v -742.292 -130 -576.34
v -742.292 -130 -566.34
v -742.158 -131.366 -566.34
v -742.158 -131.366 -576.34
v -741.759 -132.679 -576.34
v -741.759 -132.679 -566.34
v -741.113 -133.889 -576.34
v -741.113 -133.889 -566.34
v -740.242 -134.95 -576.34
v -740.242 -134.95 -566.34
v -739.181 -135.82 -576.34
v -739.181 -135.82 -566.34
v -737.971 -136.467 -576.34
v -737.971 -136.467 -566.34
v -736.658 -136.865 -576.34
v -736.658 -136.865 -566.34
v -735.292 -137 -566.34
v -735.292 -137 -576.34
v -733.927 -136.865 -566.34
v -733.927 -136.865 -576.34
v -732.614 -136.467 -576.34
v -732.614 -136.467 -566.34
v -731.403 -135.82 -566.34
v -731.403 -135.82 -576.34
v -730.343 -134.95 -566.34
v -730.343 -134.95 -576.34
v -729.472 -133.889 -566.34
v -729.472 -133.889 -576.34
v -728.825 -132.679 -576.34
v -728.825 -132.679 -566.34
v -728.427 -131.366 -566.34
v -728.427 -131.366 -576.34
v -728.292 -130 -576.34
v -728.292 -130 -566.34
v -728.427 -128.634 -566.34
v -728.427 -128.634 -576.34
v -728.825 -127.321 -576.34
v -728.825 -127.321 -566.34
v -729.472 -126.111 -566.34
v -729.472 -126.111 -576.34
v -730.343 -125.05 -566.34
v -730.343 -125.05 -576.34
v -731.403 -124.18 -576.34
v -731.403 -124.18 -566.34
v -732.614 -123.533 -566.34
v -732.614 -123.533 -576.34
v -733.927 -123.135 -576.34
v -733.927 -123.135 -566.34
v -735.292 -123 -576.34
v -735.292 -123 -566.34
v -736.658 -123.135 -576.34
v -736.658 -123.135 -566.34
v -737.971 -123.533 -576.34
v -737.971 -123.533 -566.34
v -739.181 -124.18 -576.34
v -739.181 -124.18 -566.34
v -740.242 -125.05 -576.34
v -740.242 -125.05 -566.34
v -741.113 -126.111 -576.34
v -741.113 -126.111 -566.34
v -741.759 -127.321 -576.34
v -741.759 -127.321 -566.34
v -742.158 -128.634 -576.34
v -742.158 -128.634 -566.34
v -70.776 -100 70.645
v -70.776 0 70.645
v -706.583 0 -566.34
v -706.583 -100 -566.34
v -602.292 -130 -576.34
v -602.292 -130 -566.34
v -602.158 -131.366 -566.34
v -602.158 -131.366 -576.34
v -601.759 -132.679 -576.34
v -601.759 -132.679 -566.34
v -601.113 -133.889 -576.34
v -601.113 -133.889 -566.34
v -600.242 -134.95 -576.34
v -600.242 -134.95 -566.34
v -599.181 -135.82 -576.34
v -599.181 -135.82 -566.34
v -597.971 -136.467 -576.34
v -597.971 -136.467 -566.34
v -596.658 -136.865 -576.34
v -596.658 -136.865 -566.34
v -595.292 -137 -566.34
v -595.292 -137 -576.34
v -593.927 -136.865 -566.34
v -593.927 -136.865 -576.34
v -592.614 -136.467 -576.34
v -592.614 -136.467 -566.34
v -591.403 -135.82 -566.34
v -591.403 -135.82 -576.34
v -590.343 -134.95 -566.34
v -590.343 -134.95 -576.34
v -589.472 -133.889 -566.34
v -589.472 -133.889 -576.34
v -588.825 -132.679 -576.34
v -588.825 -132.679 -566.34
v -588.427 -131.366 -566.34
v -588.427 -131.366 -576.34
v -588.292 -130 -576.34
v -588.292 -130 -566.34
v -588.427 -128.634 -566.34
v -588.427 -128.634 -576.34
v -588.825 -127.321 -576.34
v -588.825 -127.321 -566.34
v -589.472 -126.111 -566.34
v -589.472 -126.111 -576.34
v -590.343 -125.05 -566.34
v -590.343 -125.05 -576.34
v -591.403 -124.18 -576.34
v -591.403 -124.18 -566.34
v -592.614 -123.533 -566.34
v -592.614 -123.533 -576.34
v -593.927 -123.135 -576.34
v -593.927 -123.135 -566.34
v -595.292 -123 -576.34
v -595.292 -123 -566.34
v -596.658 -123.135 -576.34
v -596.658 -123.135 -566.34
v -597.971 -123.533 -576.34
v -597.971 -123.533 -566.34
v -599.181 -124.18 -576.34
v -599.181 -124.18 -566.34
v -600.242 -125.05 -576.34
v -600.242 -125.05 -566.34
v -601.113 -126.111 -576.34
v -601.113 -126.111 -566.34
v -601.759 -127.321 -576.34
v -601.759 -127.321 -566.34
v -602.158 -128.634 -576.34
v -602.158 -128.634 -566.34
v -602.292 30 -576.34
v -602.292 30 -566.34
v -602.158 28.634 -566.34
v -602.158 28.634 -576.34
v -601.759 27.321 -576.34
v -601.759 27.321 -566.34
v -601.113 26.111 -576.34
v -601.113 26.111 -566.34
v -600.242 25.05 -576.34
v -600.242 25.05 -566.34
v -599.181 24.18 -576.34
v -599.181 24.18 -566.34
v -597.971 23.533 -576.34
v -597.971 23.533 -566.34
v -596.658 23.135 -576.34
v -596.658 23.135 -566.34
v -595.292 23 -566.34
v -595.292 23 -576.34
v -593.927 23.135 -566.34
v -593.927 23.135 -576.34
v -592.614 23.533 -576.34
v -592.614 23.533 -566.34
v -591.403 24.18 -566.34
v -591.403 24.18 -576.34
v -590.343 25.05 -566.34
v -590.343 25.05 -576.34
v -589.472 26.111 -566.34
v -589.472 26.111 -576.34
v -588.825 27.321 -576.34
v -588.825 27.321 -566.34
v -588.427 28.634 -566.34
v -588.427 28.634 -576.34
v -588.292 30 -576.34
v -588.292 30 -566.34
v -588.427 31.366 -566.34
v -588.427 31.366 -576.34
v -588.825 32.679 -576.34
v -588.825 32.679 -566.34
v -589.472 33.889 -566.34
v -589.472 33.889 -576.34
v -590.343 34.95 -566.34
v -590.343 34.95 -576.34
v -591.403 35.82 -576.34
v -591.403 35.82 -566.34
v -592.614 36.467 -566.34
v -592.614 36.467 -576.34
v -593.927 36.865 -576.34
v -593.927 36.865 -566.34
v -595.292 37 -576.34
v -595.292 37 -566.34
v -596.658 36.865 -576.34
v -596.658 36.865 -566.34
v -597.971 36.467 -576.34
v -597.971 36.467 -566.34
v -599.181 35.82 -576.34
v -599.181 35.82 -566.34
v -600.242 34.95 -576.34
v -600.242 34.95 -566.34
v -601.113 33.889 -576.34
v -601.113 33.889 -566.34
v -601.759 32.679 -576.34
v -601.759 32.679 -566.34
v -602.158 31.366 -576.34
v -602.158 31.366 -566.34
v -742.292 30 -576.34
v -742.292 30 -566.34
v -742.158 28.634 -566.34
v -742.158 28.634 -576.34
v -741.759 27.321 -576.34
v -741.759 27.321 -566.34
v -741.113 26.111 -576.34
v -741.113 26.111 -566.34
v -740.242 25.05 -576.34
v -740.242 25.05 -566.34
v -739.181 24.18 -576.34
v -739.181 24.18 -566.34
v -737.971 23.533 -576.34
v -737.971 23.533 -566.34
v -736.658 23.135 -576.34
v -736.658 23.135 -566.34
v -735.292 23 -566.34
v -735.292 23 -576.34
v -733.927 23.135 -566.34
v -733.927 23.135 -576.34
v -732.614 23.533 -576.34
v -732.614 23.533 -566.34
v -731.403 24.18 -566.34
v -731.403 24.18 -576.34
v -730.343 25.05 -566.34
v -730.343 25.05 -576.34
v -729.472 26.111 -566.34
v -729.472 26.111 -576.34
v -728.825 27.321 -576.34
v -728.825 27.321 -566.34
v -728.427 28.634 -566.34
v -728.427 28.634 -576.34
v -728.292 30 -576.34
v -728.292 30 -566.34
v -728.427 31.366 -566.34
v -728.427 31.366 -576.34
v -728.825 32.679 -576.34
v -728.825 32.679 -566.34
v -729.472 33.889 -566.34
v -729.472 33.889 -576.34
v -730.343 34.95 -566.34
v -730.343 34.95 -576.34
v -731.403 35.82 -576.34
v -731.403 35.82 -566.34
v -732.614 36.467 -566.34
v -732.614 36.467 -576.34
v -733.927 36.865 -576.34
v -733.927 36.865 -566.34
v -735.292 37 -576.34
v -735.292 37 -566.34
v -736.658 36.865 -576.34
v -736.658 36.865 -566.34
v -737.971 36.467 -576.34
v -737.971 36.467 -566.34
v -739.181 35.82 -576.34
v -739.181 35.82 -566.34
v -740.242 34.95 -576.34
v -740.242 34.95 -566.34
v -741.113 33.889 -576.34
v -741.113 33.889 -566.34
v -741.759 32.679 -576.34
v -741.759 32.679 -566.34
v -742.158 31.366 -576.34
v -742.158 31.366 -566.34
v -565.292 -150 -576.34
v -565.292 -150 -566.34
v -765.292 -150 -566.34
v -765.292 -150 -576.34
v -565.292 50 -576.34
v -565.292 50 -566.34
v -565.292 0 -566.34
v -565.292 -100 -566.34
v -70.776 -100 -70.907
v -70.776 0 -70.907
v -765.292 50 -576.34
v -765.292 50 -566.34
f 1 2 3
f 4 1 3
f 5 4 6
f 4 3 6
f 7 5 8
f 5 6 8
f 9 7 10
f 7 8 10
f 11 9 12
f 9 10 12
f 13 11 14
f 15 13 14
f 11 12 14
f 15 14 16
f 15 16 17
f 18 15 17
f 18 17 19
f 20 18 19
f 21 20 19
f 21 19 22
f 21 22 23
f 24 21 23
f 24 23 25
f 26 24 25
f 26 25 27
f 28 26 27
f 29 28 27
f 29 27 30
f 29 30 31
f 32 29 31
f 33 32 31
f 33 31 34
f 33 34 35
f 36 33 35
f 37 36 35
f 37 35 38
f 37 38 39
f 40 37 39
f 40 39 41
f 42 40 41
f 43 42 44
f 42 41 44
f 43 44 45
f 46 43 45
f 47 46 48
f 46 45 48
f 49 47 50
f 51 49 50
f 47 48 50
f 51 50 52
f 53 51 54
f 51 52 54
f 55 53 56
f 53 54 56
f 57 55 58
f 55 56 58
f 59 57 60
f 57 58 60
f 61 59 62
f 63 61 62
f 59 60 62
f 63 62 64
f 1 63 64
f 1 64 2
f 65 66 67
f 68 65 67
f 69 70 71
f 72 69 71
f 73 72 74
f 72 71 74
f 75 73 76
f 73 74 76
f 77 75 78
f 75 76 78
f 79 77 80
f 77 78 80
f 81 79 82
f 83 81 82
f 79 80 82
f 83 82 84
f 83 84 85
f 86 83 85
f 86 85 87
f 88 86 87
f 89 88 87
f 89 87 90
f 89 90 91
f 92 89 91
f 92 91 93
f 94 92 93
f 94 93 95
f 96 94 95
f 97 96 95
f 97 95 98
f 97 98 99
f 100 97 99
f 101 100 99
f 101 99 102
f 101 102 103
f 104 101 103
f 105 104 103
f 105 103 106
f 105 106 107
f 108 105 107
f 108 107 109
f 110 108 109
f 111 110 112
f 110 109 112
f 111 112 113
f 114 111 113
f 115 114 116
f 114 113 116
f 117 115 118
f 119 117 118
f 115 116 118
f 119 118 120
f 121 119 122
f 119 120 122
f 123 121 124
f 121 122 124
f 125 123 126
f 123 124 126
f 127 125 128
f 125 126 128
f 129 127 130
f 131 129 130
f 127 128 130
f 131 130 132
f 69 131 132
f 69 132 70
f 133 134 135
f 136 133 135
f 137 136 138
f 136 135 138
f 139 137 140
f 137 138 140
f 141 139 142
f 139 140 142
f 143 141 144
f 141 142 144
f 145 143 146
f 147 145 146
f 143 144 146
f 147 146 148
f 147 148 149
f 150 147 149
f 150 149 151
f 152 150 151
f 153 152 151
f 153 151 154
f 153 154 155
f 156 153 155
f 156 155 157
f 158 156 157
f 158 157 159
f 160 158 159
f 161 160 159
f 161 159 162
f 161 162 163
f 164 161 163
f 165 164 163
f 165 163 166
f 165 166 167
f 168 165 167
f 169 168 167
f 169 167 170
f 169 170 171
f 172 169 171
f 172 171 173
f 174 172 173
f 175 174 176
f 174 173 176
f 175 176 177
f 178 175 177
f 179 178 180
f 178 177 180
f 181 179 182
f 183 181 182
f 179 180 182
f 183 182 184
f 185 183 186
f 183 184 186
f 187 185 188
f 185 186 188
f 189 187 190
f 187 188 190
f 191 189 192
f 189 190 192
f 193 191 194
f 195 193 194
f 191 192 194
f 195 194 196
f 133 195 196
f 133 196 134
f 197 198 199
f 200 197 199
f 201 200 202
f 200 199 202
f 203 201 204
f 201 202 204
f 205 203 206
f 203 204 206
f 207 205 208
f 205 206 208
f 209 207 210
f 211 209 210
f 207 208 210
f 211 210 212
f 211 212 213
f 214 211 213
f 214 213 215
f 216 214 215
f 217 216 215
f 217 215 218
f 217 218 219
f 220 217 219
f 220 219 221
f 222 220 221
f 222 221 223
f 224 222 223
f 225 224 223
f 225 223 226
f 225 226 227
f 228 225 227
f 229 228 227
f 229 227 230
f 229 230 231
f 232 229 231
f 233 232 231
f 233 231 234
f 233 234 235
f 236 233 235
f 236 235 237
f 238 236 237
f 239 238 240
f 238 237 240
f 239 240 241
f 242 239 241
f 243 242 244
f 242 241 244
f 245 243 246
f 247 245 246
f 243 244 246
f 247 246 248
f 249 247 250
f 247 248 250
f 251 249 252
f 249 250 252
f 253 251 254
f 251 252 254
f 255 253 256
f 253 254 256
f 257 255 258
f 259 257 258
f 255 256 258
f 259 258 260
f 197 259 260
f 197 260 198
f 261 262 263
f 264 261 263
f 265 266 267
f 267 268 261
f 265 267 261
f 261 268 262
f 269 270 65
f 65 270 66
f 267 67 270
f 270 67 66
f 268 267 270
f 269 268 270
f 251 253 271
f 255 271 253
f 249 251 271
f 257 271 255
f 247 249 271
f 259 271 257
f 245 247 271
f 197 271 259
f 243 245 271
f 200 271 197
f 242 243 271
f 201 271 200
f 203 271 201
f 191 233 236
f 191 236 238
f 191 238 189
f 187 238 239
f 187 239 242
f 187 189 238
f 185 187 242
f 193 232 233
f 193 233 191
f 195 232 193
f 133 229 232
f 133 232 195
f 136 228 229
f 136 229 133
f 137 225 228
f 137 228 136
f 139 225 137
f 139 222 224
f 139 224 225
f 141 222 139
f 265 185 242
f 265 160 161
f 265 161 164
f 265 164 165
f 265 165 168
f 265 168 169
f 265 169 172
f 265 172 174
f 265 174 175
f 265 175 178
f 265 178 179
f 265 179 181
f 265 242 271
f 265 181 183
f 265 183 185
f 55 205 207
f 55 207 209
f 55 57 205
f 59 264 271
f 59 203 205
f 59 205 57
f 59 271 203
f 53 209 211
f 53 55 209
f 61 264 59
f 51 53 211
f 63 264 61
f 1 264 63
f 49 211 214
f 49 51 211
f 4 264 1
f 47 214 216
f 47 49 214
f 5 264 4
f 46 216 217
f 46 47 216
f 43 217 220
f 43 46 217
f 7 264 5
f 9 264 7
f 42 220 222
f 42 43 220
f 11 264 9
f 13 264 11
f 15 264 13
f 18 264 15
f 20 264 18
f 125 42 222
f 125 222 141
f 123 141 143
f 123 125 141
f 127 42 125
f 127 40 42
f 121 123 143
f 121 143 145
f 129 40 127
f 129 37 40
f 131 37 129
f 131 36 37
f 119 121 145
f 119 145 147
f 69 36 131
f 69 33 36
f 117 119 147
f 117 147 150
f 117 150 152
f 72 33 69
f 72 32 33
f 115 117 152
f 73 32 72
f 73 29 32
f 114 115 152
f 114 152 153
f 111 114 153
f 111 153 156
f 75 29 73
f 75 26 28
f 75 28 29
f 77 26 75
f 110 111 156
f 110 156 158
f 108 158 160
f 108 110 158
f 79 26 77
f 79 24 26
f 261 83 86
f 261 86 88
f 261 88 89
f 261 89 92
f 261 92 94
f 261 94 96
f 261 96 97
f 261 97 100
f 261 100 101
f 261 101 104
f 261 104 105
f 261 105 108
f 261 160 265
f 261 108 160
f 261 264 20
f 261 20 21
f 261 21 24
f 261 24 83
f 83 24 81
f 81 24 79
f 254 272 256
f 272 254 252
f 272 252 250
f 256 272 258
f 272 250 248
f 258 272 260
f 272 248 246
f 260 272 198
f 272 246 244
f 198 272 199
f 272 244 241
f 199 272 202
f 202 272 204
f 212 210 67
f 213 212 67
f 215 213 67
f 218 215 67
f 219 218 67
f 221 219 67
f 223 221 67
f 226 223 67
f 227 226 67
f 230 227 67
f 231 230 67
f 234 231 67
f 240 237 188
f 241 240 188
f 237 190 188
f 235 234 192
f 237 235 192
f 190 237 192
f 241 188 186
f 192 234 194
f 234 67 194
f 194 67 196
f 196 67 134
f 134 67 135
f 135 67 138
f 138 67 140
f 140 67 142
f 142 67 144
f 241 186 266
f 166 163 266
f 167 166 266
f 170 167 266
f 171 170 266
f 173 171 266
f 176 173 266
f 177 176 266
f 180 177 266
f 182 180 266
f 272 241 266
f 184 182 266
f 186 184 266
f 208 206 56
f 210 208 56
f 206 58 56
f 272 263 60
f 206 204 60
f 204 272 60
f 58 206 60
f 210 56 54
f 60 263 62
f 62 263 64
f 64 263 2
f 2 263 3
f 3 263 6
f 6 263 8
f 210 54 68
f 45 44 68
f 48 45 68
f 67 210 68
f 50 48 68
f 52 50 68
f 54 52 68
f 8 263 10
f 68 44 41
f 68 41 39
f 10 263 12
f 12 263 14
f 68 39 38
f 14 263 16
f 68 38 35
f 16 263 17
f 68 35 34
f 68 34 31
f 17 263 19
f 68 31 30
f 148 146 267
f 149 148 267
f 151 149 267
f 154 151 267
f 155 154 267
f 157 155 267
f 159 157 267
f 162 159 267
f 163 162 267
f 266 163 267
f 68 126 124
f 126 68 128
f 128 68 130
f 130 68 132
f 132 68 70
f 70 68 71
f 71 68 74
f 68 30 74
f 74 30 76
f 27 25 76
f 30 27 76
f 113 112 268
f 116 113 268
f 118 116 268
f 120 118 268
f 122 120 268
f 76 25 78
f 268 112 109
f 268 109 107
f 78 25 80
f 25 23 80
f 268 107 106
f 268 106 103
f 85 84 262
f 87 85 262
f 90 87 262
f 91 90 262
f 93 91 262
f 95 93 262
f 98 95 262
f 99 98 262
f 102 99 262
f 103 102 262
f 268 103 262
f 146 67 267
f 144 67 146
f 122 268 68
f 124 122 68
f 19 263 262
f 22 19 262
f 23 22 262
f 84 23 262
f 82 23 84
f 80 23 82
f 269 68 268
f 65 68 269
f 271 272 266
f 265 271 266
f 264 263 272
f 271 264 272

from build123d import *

# Parameters (mm, degrees)
F1_DEPTH = 100
F3_DEPTH = 10
F5_D     = 14
F5_DEPTH = 150


with BuildPart() as f1:
    # F0 (on Front) → F1 (new body)
    with BuildSketch(Plane.XZ):
        Polygon((-70.776085, -70.907202), (-70.776085, 70.645211), (-706.58298, -566.339556), (-565.292317, -566.339556), align=None)
    extrude(amount=F1_DEPTH)

    # F2 (on face) → F3 (join)
    with BuildSketch(Plane(origin=(0, 0, -566.339556), x_dir=(1, 0, 0), z_dir=(0, 0, -1))):
        Polygon((-565.292317, -50), (-565.292317, 100), (-565.292317, 150), (-765.292317, 150), (-765.292317, -50), align=None)
    extrude(amount=F3_DEPTH)

    # F5
    with Locations(Plane(origin=(0, 0, -576.339556), x_dir=(1, 0, 0), z_dir=(0, 0, -1))):
        with Locations((-735.292317, 130), (-595.292317, 130), (-595.292317, -30), (-735.292317, -30)):
            Hole(F5_D / 2, depth=F5_DEPTH)


solid = f1.part
